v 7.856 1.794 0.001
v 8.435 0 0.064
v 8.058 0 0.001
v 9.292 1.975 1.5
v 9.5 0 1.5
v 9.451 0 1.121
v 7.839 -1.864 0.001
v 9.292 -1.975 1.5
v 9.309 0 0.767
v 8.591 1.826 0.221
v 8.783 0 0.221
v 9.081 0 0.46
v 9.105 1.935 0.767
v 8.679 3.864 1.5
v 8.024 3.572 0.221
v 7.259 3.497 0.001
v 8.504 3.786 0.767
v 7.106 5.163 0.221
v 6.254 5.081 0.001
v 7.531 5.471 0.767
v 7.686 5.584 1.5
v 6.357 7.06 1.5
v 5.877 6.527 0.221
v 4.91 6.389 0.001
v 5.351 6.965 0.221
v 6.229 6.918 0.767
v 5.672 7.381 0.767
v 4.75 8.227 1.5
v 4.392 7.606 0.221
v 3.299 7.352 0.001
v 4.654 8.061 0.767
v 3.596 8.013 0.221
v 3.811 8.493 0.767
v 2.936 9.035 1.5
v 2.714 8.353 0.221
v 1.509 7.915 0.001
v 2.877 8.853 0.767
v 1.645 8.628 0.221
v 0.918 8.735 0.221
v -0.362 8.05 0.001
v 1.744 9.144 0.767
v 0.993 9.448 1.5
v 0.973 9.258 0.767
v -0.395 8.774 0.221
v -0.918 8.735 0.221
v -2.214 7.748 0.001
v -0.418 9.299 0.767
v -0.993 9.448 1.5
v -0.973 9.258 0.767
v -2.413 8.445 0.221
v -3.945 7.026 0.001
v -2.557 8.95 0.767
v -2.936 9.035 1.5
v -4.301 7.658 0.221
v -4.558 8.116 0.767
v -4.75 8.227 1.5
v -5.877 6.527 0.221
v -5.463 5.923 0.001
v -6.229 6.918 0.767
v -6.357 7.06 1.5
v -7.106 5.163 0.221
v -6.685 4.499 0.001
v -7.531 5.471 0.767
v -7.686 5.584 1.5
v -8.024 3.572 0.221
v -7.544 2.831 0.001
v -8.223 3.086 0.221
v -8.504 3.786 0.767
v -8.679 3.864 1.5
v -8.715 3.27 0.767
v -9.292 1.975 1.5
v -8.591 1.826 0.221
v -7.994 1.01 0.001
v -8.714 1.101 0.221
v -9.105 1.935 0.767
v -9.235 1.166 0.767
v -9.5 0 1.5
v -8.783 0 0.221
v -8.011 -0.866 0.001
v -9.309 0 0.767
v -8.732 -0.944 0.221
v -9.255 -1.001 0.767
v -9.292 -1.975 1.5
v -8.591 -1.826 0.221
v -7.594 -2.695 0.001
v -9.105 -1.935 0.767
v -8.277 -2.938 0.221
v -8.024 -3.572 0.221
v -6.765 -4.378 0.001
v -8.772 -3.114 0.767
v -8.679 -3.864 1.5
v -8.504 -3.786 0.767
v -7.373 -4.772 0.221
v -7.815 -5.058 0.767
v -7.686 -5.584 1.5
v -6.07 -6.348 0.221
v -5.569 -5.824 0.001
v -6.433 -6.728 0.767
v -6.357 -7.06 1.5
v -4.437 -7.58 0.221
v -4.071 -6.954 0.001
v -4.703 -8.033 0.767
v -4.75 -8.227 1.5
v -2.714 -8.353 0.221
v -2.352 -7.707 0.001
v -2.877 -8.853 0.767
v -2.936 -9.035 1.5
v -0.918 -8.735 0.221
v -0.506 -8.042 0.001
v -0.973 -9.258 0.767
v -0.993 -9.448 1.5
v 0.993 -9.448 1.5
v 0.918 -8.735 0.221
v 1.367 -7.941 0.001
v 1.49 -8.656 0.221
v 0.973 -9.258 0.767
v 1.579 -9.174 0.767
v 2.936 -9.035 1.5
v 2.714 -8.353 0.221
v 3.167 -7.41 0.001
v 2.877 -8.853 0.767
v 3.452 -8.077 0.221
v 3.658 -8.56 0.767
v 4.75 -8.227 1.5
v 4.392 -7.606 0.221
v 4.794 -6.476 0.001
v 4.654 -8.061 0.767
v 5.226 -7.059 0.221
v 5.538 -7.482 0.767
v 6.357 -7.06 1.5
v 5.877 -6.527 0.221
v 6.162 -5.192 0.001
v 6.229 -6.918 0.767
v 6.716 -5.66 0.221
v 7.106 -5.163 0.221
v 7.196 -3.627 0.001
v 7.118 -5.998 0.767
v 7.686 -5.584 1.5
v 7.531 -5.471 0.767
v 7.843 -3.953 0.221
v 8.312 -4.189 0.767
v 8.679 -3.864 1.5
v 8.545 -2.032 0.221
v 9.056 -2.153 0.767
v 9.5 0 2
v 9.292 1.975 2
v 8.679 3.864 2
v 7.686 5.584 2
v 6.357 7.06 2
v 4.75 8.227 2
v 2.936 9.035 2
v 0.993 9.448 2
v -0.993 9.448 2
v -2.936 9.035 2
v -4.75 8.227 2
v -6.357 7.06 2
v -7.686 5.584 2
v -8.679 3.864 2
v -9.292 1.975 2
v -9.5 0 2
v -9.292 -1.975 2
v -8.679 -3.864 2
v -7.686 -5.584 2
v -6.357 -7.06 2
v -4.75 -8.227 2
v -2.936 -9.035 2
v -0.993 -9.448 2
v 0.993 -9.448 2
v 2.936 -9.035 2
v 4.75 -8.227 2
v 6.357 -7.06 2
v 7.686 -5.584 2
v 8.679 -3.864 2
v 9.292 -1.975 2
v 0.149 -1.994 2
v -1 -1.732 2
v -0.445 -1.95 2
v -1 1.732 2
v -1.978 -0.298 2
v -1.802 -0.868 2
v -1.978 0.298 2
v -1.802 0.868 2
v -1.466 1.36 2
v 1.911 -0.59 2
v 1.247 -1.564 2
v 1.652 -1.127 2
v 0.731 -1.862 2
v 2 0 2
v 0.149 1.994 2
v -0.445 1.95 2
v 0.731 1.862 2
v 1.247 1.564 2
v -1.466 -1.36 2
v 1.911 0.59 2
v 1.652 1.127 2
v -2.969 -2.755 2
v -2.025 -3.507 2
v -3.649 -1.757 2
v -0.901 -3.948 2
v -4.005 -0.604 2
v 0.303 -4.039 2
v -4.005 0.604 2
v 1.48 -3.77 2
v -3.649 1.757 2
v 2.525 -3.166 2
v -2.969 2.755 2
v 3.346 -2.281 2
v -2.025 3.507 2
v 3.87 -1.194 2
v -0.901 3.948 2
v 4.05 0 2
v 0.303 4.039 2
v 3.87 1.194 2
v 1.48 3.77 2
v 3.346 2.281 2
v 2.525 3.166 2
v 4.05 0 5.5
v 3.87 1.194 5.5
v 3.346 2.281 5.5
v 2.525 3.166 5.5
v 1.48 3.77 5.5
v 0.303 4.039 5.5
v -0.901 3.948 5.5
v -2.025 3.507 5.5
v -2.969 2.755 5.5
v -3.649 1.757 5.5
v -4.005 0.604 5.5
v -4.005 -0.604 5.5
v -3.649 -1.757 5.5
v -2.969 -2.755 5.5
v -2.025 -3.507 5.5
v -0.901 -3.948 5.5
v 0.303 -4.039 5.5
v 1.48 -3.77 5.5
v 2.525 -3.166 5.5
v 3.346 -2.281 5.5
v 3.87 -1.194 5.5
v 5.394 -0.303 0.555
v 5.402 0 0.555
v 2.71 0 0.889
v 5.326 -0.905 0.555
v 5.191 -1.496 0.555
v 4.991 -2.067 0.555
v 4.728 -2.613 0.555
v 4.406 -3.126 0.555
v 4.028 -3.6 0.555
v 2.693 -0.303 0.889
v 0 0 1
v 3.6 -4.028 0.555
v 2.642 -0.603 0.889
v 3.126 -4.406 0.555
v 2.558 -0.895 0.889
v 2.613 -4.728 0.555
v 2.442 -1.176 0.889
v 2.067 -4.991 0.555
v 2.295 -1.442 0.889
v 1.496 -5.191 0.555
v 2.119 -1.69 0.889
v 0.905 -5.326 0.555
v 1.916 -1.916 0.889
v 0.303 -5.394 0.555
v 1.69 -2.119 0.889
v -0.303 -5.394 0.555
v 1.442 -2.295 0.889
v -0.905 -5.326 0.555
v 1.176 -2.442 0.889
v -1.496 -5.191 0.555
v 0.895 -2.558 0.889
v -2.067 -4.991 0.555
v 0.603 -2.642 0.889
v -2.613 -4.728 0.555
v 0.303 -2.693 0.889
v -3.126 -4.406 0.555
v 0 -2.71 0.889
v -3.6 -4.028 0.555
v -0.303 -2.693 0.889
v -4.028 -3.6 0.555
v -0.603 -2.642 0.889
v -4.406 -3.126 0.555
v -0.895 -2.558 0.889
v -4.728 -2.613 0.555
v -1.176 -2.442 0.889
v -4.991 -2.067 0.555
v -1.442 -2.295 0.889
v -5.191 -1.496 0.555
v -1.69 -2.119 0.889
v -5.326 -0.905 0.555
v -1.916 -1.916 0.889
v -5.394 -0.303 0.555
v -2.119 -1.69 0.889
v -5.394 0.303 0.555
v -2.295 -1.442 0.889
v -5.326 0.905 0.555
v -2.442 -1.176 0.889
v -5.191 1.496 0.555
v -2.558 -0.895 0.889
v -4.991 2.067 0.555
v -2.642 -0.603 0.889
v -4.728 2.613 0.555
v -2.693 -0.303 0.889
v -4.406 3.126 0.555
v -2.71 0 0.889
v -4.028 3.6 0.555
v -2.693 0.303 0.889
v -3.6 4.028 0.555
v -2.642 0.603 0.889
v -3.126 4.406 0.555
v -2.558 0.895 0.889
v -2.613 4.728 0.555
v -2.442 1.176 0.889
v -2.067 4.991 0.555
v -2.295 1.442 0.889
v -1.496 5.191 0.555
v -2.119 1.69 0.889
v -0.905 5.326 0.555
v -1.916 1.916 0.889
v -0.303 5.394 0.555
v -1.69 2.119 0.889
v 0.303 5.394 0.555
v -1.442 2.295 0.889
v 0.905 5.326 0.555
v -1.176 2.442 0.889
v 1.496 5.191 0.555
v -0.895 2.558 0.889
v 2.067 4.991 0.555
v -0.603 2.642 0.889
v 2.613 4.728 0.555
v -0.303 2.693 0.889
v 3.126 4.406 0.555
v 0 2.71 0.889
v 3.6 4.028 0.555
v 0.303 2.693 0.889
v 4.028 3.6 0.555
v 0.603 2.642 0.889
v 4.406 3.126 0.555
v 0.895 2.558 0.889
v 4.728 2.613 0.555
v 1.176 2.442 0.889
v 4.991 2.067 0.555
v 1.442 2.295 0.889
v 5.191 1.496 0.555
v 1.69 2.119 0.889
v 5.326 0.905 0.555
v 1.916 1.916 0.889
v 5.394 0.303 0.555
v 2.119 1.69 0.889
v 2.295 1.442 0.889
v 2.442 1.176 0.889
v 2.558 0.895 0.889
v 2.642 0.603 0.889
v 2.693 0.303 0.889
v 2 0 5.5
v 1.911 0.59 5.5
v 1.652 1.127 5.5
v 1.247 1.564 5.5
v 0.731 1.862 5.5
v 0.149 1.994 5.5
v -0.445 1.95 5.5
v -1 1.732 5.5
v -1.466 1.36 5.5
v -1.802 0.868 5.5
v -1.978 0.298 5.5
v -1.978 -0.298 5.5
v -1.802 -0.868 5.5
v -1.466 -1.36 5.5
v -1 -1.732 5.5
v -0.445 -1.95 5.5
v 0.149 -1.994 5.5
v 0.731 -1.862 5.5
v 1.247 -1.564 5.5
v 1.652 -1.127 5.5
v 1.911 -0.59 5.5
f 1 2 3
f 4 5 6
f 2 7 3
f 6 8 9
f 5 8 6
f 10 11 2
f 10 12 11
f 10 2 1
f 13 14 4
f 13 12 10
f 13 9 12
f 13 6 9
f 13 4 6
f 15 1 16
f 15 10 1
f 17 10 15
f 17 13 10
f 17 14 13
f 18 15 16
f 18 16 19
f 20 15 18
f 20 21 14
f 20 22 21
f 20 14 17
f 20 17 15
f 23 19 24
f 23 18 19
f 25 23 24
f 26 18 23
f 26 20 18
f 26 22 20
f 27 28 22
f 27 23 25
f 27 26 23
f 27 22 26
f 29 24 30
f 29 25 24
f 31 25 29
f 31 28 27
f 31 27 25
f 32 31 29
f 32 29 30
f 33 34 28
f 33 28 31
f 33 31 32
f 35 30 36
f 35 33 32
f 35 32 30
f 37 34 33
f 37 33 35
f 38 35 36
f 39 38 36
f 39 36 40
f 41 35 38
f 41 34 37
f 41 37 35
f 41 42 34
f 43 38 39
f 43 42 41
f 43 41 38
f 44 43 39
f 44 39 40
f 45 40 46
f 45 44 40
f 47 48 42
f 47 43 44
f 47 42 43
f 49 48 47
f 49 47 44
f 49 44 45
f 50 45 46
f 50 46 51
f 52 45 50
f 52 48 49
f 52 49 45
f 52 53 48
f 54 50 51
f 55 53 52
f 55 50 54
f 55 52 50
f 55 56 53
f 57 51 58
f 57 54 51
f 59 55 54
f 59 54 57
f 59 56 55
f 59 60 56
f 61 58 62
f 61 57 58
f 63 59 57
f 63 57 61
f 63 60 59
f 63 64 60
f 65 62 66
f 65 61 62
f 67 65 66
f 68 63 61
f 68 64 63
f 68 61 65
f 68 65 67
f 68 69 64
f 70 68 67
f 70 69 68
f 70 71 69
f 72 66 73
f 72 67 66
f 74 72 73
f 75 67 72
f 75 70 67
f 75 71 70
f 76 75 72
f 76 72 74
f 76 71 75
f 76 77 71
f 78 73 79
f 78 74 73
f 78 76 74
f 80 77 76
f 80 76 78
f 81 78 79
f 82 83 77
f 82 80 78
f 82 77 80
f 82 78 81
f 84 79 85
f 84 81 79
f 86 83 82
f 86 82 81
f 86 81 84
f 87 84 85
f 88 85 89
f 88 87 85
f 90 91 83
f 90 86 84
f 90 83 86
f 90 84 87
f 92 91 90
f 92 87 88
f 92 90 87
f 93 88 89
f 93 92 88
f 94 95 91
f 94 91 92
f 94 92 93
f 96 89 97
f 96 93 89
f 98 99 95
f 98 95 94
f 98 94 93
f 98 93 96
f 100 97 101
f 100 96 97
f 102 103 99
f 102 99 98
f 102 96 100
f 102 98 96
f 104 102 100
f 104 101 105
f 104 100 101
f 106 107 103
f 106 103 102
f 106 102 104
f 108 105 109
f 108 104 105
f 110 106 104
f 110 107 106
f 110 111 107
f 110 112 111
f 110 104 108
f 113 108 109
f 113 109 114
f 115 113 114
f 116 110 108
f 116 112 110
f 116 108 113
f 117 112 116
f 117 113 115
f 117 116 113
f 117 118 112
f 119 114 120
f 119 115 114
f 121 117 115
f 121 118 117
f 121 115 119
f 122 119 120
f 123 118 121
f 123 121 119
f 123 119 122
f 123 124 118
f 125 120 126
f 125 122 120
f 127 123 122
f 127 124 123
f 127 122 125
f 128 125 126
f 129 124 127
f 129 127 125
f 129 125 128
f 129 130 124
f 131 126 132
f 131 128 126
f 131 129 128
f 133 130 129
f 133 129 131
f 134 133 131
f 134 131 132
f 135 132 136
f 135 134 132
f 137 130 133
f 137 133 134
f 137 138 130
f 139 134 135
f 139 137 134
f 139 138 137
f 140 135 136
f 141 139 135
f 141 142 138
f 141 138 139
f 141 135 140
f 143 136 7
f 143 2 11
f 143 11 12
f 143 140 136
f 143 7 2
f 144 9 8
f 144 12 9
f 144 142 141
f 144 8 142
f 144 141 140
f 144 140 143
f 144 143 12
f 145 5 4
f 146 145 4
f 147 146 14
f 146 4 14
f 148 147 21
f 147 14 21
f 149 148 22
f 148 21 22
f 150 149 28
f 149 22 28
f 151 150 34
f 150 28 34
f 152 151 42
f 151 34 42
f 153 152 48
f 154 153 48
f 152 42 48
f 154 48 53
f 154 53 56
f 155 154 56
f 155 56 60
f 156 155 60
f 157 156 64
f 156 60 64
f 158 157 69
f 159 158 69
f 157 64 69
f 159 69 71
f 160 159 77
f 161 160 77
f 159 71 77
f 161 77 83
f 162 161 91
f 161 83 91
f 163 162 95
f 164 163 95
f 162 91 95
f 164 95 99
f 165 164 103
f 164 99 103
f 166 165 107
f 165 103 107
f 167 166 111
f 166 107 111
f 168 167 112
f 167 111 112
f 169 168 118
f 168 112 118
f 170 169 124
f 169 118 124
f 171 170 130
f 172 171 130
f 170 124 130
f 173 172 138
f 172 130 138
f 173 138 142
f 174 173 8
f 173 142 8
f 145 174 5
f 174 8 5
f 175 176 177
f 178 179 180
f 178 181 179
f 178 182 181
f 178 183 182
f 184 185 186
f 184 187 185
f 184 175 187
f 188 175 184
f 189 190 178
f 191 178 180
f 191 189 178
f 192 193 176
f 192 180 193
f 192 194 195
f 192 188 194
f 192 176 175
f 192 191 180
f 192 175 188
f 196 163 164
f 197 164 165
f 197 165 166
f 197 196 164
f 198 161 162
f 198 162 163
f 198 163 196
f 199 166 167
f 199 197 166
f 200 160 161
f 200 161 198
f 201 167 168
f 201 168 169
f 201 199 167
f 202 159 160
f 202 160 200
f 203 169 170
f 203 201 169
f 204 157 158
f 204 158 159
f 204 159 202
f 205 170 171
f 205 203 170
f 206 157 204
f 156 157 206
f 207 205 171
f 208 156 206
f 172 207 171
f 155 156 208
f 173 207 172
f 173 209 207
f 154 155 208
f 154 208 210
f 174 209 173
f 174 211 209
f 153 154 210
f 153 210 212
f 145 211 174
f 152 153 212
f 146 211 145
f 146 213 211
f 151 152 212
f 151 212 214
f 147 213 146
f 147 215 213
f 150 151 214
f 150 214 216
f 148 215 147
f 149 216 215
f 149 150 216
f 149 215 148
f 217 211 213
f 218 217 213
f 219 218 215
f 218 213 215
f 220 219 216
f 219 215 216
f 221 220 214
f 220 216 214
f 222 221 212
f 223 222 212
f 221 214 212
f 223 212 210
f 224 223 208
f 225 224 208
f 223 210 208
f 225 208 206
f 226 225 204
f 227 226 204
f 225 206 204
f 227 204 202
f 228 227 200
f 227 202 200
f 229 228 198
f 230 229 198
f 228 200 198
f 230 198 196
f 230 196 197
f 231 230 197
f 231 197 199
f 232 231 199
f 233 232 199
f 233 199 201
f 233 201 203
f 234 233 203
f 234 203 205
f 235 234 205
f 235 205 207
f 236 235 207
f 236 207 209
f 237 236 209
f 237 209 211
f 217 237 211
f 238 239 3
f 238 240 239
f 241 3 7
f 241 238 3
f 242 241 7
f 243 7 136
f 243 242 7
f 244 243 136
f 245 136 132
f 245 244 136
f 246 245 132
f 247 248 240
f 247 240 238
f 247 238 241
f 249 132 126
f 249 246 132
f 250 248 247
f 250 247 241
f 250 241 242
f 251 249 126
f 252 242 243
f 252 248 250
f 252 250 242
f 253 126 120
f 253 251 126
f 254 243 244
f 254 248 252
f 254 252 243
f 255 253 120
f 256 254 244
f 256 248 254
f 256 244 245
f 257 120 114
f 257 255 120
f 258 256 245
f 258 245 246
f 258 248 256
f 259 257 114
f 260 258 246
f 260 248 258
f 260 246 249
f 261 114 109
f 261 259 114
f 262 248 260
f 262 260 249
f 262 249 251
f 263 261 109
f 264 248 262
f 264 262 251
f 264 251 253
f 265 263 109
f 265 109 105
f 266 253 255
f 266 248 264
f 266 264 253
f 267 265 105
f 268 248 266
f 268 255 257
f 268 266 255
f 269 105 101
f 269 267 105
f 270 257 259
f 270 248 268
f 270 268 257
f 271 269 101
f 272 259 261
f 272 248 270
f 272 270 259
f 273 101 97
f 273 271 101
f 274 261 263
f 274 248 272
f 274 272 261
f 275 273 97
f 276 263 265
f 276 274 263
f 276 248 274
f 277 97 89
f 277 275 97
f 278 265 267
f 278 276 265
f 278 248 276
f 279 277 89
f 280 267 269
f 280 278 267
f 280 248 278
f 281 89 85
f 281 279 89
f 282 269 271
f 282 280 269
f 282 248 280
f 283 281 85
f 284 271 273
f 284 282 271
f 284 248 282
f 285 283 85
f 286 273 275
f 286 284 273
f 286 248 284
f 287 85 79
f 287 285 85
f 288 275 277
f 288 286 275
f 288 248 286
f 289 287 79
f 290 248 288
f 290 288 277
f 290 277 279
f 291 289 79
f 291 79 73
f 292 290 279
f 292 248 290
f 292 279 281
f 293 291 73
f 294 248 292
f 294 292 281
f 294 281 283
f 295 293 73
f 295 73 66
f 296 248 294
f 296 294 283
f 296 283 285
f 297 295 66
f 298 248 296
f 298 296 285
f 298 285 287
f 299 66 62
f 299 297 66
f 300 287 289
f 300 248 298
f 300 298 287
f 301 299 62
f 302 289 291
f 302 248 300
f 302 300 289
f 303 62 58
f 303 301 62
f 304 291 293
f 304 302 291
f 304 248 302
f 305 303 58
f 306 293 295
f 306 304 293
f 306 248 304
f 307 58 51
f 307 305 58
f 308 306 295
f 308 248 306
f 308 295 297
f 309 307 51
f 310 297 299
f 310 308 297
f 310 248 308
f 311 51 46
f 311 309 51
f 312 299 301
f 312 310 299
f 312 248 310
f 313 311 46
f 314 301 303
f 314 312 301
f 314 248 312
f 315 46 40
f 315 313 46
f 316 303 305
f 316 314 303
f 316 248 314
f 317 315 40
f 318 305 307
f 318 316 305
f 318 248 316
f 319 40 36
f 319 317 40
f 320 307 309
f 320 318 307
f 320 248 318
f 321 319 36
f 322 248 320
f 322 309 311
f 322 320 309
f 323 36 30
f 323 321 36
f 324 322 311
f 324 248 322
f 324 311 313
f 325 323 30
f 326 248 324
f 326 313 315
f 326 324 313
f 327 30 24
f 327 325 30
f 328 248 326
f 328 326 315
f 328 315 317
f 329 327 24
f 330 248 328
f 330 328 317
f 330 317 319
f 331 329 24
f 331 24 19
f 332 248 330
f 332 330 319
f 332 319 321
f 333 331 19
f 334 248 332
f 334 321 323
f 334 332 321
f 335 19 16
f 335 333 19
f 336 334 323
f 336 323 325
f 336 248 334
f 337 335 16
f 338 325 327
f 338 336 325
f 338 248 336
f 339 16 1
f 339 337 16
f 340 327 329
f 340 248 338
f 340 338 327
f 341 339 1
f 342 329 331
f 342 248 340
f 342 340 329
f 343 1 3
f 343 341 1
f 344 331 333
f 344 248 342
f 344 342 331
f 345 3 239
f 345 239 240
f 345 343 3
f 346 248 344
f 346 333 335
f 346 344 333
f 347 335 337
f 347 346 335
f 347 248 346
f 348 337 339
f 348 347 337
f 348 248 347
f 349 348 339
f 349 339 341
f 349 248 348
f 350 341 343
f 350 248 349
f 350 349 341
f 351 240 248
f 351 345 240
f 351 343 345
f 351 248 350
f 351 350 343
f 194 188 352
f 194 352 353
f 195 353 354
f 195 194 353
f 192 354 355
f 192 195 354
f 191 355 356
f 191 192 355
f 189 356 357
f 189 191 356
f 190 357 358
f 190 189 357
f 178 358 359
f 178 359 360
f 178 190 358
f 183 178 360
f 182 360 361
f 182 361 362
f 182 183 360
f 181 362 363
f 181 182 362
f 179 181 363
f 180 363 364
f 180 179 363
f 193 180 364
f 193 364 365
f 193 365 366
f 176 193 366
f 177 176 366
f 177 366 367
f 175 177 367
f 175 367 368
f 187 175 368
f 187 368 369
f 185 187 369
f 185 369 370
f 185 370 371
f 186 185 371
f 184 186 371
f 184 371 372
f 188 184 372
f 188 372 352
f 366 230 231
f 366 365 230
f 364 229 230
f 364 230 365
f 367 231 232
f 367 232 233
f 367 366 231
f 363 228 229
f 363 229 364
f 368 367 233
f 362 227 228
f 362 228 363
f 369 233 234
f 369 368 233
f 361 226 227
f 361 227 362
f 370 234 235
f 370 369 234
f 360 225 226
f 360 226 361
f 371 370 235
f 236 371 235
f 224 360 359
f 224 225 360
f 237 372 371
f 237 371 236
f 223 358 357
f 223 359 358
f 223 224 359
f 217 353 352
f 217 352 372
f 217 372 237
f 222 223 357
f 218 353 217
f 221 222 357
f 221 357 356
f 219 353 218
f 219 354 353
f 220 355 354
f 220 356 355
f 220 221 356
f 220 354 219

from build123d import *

# Parameters (mm, degrees)
F0_R     = 9.5
F0_R_2   = 4.05
F0_R_3   = 2
F1_DEPTH = 2
F2_R     = 4.05
F2_R_2   = 2
F3_DEPTH = 5.5
F4_R     = 1.5


# Not quite as in the source:
# - a feature names something its author has since deleted; it is built from what else it names


with BuildPart() as f1:
    # F0 (on Top) → F1 (new body)
    with BuildSketch(Plane.XY):
        Circle(F0_R)
        Circle(F0_R_2, mode=Mode.SUBTRACT)
        Circle(F0_R_2)
        Circle(F0_R_3, mode=Mode.SUBTRACT)
        Circle(F0_R_3)
    extrude(amount=F1_DEPTH)

    # F2 (on Top) → F3 (join)
    with BuildSketch(Plane.XY):
        Circle(F2_R)
        Circle(F2_R_2, mode=Mode.SUBTRACT)
    extrude(amount=F3_DEPTH)

    # F4
    f4_edges = [f1.edges().sort_by_distance(p)[0] for p in [
        (-9.5, 0, 0),
    ]]
    fillet(f4_edges, radius=F4_R)

    # F5 (on Front) → F6 (revolve, cut)
    with BuildSketch(Plane.XZ):
        with BuildLine():
            ThreePointArc((0, 0), (23.1570723538, -9.489364109), (32.9962119038, -32.5))
            ThreePointArc((32.9962119038, -32.5), (23.510635891, -8.8429276462), (0, 1))
            Line((0, 1), (0, 0))
        make_face()
    revolve(axis=Axis((0, 0, -31.5146126637), (0, 0, -1)), mode=Mode.SUBTRACT)


solid = f1.part
